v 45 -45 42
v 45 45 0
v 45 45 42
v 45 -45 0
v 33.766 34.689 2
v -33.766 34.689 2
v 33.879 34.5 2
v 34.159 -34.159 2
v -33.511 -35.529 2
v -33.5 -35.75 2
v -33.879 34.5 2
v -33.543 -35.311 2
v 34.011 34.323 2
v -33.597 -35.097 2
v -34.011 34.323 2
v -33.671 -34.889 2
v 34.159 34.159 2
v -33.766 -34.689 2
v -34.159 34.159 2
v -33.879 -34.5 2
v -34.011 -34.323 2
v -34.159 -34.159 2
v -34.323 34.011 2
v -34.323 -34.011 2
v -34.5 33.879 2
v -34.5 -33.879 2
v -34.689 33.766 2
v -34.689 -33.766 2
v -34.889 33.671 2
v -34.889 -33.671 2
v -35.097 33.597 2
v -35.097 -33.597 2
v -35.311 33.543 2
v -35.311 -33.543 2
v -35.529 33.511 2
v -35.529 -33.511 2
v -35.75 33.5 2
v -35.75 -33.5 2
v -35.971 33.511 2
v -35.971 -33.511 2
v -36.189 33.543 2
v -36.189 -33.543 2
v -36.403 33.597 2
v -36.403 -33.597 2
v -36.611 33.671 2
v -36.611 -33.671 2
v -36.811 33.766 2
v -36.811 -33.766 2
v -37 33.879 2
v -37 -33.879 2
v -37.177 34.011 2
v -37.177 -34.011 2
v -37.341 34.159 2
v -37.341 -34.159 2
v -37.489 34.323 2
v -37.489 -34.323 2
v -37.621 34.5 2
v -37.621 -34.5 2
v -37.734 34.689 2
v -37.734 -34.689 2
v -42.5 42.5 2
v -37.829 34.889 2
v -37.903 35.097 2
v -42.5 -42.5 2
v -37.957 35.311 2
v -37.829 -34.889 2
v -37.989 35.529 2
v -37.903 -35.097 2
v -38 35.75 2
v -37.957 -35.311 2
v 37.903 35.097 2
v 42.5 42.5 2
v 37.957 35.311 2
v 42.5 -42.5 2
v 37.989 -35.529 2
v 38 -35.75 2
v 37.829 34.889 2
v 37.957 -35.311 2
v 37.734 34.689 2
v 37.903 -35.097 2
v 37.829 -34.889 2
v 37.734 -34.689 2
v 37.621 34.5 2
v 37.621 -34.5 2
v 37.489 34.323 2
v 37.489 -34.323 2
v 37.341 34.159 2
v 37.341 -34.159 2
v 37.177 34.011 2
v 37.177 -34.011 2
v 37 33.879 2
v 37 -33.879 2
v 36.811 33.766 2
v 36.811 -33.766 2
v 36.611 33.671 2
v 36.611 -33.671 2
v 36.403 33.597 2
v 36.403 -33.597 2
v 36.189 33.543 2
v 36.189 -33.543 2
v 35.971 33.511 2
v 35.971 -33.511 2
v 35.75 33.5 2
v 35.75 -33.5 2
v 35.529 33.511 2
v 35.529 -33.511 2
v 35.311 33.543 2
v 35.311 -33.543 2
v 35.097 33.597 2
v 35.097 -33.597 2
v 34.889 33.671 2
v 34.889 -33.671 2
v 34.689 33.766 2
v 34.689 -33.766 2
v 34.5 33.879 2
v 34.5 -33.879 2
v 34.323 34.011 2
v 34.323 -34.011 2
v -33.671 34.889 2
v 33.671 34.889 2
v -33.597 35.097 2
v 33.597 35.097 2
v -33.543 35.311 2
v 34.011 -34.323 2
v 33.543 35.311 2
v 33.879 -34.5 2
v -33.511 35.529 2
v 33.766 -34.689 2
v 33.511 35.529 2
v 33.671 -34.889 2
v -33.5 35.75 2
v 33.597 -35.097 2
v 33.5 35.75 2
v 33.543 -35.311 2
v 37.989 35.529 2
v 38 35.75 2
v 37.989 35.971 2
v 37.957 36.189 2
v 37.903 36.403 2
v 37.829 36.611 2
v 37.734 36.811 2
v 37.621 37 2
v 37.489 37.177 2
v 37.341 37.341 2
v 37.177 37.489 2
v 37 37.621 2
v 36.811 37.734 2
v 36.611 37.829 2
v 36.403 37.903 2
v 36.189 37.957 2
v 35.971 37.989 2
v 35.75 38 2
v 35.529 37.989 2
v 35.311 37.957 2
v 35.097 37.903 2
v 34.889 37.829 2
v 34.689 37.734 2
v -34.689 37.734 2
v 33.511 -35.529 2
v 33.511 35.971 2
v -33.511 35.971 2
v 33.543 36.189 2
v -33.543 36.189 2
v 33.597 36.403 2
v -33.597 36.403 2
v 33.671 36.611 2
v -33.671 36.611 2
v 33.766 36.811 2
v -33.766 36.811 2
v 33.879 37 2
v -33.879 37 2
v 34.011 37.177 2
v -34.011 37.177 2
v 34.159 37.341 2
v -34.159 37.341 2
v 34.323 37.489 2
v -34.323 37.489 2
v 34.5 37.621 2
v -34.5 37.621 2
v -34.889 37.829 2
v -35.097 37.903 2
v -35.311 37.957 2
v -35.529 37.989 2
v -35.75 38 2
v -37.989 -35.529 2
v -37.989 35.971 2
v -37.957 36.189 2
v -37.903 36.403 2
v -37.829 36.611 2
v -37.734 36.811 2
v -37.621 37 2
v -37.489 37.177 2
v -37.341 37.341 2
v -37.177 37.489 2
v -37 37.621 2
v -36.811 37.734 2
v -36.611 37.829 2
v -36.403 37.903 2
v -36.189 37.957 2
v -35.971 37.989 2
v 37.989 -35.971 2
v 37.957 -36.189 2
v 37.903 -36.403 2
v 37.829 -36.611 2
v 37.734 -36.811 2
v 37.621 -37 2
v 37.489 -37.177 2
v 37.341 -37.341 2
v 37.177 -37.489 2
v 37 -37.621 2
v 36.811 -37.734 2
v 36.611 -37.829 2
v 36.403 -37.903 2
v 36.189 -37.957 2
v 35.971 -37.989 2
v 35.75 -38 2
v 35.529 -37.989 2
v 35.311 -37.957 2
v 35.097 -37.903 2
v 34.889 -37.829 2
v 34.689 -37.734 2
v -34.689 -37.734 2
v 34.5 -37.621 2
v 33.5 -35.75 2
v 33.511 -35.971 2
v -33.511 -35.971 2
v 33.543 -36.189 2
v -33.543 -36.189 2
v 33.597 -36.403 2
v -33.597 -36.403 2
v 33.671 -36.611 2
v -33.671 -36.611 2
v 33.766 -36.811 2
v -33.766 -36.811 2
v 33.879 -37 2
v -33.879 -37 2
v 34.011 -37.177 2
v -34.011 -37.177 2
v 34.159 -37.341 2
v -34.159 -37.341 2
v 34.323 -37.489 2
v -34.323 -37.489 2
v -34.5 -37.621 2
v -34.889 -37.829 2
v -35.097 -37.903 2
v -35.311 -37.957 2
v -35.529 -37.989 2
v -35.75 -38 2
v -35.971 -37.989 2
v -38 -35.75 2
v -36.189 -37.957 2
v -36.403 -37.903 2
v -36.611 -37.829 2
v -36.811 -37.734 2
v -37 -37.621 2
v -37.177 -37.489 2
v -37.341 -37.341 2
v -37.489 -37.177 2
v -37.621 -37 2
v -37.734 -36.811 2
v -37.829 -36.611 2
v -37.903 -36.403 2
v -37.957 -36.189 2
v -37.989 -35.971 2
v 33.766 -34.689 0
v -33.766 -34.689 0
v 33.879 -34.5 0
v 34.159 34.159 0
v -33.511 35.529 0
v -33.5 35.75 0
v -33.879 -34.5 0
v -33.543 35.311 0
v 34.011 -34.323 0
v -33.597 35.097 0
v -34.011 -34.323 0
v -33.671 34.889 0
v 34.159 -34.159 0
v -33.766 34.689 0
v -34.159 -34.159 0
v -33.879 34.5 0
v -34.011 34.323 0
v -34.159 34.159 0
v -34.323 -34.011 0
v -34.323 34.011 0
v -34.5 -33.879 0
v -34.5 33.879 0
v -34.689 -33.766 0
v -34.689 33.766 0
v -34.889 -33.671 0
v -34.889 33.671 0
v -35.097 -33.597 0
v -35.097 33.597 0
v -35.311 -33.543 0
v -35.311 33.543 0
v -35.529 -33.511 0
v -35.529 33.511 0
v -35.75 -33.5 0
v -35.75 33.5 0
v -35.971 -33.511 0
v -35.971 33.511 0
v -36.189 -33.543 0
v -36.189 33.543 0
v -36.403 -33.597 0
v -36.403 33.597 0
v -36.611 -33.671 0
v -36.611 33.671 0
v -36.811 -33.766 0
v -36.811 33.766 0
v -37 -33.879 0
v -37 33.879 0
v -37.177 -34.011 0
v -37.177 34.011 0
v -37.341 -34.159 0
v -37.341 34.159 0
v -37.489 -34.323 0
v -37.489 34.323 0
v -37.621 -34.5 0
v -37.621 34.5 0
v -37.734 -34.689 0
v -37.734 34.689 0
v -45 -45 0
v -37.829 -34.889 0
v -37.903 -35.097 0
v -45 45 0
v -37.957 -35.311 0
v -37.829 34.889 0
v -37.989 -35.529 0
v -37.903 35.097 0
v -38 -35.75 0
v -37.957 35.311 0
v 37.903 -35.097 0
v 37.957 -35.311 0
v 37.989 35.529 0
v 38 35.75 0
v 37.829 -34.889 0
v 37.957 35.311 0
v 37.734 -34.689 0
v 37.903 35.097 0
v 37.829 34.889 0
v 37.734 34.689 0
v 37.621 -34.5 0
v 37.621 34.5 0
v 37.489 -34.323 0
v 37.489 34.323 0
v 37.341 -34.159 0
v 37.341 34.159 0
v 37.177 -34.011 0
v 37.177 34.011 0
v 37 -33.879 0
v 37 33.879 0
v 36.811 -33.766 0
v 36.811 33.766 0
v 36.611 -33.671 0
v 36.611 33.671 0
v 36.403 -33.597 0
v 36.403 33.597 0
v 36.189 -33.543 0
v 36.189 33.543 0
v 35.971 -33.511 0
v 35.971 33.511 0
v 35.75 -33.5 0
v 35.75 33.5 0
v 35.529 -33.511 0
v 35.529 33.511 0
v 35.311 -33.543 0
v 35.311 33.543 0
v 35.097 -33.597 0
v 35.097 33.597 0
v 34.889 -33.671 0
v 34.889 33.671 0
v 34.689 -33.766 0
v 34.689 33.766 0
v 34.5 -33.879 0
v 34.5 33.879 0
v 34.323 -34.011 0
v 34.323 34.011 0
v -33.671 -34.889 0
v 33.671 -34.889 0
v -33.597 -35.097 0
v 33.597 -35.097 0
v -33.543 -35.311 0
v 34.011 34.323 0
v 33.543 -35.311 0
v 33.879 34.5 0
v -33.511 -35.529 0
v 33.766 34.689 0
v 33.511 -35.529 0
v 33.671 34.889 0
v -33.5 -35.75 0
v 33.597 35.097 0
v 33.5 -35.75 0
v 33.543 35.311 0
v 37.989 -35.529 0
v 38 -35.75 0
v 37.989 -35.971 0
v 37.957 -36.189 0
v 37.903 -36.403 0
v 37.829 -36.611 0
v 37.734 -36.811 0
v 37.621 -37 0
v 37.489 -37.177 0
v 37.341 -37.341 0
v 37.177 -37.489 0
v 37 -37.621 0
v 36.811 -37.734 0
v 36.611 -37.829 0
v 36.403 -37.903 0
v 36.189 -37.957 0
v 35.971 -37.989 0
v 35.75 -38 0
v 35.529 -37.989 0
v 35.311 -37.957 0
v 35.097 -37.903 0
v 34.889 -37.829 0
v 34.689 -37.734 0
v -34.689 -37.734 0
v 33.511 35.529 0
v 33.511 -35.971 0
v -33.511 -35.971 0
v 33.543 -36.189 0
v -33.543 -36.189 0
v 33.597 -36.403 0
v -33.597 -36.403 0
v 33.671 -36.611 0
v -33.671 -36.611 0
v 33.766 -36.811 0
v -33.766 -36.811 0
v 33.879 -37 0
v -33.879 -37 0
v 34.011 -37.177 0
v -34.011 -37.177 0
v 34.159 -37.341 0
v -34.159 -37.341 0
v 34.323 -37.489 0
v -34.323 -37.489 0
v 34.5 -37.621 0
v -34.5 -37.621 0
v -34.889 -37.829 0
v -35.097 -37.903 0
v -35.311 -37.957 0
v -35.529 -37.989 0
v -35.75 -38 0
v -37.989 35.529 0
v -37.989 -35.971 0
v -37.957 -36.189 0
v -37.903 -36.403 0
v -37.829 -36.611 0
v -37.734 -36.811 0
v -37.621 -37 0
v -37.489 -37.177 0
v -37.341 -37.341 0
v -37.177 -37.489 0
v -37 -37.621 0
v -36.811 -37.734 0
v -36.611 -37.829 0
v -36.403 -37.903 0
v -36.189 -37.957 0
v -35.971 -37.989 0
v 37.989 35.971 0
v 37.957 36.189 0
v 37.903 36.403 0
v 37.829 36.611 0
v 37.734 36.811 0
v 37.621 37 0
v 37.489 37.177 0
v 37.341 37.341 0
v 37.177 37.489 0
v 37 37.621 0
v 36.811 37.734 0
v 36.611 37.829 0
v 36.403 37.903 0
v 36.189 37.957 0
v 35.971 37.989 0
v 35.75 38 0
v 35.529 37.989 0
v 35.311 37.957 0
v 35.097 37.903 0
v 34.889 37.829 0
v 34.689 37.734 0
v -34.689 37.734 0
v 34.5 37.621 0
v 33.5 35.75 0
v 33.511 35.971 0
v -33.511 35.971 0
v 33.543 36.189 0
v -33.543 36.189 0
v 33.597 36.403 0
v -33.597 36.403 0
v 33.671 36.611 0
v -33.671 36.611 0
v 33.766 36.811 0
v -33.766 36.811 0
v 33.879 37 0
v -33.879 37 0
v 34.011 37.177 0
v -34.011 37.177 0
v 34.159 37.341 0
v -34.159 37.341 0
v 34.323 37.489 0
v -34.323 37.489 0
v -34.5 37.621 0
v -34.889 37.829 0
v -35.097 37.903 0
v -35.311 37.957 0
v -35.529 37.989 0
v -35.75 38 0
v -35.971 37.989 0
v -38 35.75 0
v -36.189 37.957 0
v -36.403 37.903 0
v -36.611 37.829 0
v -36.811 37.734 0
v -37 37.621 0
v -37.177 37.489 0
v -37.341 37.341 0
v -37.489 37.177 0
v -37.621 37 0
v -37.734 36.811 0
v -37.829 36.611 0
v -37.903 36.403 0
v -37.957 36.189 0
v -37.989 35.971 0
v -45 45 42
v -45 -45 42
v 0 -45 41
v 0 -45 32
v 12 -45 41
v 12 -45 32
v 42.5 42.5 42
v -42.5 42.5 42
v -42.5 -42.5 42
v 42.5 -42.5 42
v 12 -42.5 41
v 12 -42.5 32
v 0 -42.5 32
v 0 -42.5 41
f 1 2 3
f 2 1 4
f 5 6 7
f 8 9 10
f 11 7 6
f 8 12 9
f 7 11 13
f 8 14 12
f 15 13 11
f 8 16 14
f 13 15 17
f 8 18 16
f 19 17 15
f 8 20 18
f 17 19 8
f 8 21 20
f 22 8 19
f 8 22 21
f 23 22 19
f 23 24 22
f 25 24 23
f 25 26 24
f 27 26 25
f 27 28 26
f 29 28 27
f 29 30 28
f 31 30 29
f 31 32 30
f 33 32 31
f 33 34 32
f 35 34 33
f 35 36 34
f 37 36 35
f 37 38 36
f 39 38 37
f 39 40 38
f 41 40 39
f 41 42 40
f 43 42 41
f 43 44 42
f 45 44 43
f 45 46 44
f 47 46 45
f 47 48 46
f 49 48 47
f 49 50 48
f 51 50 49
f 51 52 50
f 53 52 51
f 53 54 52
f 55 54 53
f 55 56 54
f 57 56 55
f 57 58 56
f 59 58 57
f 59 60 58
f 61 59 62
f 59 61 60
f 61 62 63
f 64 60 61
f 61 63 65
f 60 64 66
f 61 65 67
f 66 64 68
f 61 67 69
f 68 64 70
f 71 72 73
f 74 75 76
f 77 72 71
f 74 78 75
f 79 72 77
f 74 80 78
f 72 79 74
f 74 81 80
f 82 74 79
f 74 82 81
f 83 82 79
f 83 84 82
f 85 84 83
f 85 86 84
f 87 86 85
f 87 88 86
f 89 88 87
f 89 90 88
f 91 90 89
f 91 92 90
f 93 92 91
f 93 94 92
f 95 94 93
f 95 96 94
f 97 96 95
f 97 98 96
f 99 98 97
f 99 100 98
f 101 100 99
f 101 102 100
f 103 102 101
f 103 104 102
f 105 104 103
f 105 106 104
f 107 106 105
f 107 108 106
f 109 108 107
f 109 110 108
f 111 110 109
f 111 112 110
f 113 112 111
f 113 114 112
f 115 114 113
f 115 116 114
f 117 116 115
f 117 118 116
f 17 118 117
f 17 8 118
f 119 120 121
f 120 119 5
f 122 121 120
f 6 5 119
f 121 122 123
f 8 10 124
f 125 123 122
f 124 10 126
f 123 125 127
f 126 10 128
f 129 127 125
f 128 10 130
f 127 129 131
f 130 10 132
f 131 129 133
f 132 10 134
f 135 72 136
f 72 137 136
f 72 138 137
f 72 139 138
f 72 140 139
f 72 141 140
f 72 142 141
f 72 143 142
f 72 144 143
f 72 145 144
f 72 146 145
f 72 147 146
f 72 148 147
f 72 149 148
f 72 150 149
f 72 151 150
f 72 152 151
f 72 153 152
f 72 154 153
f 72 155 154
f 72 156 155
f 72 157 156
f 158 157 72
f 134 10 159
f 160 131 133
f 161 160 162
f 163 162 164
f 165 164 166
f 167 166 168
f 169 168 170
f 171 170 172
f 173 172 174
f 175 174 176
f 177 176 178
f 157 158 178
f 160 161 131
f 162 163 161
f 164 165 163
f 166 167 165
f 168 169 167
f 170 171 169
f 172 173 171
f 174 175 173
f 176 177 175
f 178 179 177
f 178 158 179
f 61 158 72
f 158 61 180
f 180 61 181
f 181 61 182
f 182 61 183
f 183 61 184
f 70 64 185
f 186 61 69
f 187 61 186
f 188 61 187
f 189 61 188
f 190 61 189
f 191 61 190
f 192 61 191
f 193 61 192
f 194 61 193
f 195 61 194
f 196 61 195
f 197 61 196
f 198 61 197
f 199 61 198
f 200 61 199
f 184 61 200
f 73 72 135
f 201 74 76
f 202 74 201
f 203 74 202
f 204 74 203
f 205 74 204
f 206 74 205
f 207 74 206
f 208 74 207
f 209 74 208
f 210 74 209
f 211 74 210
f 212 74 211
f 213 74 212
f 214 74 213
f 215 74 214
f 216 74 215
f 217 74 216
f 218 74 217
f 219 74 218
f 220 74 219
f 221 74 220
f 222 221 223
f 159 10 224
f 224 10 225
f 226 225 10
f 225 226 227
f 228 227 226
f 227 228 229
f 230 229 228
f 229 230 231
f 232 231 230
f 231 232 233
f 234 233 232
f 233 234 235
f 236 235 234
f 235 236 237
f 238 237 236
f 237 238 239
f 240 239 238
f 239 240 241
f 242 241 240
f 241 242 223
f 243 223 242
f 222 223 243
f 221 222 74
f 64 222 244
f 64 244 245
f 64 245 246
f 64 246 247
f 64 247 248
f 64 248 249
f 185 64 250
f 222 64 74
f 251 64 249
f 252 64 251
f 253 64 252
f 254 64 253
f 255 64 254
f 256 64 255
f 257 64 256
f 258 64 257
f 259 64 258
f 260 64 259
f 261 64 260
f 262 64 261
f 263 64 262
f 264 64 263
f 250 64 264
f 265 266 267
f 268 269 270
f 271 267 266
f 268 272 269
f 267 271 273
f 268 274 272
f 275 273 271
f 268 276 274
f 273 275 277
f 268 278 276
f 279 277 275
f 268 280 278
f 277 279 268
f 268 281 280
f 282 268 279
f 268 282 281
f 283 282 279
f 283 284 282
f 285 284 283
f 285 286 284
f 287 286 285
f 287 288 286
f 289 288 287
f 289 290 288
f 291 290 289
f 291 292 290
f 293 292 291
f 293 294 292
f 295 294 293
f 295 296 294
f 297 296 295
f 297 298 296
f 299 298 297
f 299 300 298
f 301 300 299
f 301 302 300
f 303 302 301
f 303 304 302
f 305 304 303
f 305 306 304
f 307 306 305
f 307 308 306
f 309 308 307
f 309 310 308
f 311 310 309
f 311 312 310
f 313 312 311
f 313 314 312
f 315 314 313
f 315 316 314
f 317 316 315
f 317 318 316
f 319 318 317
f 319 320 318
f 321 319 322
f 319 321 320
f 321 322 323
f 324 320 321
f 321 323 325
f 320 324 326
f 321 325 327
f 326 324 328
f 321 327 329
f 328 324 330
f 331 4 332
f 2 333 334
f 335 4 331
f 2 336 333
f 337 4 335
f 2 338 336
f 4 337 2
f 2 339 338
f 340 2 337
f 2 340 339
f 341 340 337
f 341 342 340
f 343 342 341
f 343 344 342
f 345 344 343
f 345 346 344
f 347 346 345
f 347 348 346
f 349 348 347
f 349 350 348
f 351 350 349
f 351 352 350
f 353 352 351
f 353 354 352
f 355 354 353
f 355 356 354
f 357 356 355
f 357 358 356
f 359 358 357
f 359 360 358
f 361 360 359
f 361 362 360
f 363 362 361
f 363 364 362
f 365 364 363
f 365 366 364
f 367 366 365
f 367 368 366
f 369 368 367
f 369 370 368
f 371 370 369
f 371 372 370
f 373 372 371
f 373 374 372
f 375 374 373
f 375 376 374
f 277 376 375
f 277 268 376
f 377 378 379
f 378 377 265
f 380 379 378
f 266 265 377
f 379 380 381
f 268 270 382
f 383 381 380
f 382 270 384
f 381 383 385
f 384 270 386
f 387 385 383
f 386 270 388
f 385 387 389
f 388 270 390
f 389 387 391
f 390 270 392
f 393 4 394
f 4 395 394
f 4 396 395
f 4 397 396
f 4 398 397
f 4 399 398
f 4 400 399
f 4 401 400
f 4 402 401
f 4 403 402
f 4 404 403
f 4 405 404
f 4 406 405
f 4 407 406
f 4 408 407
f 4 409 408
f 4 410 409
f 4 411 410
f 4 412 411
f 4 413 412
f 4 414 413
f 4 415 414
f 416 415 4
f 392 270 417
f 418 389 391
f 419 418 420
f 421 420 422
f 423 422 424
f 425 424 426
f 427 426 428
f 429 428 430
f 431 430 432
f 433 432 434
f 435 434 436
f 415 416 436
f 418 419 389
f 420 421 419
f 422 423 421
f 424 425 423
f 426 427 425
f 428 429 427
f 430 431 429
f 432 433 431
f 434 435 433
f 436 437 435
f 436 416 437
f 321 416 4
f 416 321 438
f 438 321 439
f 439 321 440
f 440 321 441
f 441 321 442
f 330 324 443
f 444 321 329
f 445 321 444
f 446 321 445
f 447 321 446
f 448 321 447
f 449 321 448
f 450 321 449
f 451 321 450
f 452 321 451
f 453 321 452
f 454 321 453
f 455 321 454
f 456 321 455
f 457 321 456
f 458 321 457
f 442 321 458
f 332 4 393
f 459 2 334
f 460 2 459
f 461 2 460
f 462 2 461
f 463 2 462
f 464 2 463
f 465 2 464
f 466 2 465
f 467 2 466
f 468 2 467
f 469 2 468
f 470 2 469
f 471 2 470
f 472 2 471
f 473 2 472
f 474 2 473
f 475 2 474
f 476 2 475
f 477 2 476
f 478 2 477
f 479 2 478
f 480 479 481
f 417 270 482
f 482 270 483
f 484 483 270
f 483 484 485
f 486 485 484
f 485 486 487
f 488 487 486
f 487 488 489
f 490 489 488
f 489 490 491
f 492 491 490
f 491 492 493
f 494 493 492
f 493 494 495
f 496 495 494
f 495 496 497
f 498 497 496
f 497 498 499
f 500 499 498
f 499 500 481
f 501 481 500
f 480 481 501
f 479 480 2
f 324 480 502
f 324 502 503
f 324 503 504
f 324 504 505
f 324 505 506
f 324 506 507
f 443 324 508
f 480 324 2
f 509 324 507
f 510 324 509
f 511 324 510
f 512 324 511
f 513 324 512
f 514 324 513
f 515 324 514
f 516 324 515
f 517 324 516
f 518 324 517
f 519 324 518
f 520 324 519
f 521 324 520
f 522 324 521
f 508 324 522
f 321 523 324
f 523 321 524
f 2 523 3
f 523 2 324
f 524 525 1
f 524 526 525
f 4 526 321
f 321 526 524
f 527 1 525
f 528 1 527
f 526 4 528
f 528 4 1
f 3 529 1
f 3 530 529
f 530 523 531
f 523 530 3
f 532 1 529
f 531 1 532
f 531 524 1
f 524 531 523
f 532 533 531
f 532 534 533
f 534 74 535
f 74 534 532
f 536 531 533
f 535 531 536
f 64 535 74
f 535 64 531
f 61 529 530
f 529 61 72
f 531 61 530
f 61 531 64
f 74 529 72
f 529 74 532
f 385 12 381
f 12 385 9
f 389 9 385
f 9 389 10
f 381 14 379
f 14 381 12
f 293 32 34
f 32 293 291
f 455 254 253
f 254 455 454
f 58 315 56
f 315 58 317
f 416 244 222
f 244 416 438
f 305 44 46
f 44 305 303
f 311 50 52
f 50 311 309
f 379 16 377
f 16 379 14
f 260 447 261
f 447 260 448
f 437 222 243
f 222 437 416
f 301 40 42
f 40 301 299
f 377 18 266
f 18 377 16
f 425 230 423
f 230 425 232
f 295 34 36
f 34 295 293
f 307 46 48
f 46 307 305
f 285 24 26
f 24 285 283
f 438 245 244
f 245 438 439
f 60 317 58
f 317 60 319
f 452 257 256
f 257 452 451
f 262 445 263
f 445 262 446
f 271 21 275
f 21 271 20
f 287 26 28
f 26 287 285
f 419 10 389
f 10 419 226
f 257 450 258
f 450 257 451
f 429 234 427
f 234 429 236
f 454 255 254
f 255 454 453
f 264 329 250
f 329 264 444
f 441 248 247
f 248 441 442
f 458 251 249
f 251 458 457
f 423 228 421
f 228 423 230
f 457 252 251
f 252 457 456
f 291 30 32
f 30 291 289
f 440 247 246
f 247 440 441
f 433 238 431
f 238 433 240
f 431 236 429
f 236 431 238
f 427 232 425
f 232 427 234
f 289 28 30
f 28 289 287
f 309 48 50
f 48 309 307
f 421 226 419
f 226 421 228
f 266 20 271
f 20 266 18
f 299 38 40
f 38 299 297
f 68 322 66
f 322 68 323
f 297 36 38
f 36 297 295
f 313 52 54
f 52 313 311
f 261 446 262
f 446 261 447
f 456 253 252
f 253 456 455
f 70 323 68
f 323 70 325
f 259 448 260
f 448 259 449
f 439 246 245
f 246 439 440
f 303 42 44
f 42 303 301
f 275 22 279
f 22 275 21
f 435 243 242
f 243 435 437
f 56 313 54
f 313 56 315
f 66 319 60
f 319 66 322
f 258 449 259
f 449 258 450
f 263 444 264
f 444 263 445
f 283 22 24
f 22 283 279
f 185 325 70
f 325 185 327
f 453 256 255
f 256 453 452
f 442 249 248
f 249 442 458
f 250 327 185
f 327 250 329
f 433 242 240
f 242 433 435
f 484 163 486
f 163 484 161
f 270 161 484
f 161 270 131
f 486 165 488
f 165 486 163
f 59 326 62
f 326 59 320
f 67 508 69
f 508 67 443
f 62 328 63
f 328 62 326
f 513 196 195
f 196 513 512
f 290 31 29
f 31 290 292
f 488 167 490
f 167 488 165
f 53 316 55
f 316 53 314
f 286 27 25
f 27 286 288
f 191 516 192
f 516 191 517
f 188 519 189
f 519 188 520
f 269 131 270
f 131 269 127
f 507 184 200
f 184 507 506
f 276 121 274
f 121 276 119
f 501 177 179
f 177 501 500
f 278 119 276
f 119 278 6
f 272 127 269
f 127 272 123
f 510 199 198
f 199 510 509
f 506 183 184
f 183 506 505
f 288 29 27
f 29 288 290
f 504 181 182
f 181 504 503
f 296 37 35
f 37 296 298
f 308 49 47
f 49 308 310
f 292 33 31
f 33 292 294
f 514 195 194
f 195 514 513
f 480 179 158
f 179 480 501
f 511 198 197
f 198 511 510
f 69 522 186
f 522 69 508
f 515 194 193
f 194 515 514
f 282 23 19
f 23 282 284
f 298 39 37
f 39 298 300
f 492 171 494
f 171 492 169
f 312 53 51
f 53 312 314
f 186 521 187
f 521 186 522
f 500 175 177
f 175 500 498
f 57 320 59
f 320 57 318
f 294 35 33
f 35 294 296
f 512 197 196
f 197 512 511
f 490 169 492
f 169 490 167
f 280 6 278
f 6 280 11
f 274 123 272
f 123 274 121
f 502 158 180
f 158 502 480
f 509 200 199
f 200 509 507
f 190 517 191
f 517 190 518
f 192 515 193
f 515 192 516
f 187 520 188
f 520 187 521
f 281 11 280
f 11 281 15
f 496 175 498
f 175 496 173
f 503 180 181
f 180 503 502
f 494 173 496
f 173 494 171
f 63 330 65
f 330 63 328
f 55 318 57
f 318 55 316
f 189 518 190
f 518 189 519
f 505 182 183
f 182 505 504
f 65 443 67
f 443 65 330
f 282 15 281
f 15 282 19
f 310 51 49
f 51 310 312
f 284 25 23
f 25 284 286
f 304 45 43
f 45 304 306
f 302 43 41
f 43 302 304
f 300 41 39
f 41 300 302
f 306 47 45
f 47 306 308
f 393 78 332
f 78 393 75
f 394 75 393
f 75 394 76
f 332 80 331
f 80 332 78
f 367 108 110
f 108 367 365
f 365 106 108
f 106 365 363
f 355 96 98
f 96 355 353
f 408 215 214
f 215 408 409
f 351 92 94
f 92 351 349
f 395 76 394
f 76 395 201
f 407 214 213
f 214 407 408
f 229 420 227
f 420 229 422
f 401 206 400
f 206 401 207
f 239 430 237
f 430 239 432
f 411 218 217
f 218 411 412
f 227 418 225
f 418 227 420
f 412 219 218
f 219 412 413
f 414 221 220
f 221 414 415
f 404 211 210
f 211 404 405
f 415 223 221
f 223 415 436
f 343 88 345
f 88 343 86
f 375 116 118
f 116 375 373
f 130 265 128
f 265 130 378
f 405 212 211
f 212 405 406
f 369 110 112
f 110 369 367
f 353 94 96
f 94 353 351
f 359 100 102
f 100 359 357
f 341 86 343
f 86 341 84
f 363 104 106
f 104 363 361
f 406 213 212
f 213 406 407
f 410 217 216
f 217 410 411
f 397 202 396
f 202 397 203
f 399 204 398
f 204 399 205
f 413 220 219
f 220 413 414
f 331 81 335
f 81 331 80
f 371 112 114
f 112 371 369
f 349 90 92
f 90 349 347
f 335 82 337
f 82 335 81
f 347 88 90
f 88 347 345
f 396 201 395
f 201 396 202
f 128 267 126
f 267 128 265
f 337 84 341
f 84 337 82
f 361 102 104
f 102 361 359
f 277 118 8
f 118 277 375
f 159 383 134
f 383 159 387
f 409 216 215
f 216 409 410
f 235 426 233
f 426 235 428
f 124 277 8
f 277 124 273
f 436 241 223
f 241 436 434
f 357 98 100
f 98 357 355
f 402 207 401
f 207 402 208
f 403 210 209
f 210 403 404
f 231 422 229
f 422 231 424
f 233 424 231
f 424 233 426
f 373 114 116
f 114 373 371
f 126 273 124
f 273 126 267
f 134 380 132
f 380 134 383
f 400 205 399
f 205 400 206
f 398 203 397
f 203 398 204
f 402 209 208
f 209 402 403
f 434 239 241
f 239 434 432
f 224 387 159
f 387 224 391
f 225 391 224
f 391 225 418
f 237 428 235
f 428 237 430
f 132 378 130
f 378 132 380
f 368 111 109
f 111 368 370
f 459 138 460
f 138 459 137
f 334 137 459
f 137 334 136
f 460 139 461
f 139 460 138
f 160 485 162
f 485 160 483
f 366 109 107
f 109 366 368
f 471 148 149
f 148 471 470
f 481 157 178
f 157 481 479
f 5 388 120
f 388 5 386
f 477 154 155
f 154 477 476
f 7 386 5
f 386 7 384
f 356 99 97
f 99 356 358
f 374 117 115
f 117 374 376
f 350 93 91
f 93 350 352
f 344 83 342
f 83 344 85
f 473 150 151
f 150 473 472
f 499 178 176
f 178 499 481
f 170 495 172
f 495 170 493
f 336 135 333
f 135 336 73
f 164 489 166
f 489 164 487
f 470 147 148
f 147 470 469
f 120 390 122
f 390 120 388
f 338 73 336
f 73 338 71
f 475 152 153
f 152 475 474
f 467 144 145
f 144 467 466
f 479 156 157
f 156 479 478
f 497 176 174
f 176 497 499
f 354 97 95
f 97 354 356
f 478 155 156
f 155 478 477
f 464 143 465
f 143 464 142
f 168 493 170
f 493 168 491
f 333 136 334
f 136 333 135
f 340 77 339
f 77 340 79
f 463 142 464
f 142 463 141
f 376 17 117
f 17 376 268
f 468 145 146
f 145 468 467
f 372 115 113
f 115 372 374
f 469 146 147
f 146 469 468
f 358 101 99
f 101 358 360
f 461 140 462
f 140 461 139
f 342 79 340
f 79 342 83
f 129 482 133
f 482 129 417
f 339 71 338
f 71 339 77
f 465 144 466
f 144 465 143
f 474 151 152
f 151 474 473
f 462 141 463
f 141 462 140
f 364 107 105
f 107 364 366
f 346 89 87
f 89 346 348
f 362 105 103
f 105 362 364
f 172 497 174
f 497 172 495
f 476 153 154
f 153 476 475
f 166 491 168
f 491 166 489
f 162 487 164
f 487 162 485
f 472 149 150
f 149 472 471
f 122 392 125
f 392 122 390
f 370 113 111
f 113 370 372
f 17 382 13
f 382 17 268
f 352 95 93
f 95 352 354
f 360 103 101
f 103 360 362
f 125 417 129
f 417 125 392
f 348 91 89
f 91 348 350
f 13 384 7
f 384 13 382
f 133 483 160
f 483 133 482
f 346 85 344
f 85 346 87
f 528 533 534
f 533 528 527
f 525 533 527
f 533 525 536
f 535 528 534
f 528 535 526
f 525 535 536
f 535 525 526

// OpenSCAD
// DIY magnetic stirrer housing for an 80 mm PC case fan.
// Modelled in print orientation: the 2 mm top plate lies on the bed (z = 0..2)
// and the four 2.5 mm walls rise to z = 40, leaving the box open at the top.

$fn = 64;

// ---- Dimensions (mm) ----
top_plate_t   = 2;    // thickness of the top (stirring) plate
wall_t        = 2.5;  // thickness of each side wall
wall_h        = 40;   // wall height above the top plate (box open at z = 40)
outer_x       = 90;   // outer size in X
outer_y       = 90;   // outer size in Y

// M4 screw holes through the top plate, on the fan's mounting square
hole_d        = 4.5;  // hole diameter
hole_pitch    = 71.5; // square pitch, centred on the plate

// Power-cable notch in one wall
notch_w       = 12;   // notch width
notch_top     = 40;   // notch reaches the open edge (z = 40)
notch_bot     = 32;   // notch bottom (8 mm down from the open edge)

// ---- Derived geometry ----
inner_x       = outer_x - 2 * wall_t;   // inner clear width in X
inner_y       = outer_y - 2 * wall_t;   // inner clear width in Y

// ---- Body: top plate + four walls (union) ----
module body() { union() {
    // Top plate, centred on the origin, resting on the bed
    translate([-outer_x/2, -outer_y/2, 0])
        cube([outer_x, outer_y, top_plate_t]);

    // Four walls rising from the top plate to z = wall_h
    // South wall (front, -Y side)
    translate([-outer_x/2, -outer_y/2, top_plate_t])
        cube([outer_x, wall_t, wall_h]);
    // North wall (back, +Y side)
    translate([-outer_x/2, outer_y/2 - wall_t, top_plate_t])
        cube([outer_x, wall_t, wall_h]);
    // West wall (left, -X side)
    translate([-outer_x/2, -inner_y/2, top_plate_t])
        cube([wall_t, inner_y, wall_h]);
    // East wall (right, +X side)
    translate([outer_x/2 - wall_t, -inner_y/2, top_plate_t])
        cube([wall_t, inner_y, wall_h]);
} }

// ---- Cuts ----
// Four M4 screw holes through the top plate (extend 1 mm past each face)
module screw_holes() { for (dx = [-hole_pitch/2, hole_pitch/2],
                   dy = [-hole_pitch/2, hole_pitch/2])
    translate([dx, dy, -1])
        cylinder(h = top_plate_t + 2, d = hole_d, $fn = $fn); }

// Power-cable notch in the south wall (extend 1 mm past each face it cuts)
module cable_notch() { translate([0, -outer_y/2 - 1, notch_bot])
    cube([notch_w, wall_t + 2, notch_top - notch_bot + 1]); }

// ---- Final part ----
difference() {
    body();
    screw_holes();
    cable_notch();
}
